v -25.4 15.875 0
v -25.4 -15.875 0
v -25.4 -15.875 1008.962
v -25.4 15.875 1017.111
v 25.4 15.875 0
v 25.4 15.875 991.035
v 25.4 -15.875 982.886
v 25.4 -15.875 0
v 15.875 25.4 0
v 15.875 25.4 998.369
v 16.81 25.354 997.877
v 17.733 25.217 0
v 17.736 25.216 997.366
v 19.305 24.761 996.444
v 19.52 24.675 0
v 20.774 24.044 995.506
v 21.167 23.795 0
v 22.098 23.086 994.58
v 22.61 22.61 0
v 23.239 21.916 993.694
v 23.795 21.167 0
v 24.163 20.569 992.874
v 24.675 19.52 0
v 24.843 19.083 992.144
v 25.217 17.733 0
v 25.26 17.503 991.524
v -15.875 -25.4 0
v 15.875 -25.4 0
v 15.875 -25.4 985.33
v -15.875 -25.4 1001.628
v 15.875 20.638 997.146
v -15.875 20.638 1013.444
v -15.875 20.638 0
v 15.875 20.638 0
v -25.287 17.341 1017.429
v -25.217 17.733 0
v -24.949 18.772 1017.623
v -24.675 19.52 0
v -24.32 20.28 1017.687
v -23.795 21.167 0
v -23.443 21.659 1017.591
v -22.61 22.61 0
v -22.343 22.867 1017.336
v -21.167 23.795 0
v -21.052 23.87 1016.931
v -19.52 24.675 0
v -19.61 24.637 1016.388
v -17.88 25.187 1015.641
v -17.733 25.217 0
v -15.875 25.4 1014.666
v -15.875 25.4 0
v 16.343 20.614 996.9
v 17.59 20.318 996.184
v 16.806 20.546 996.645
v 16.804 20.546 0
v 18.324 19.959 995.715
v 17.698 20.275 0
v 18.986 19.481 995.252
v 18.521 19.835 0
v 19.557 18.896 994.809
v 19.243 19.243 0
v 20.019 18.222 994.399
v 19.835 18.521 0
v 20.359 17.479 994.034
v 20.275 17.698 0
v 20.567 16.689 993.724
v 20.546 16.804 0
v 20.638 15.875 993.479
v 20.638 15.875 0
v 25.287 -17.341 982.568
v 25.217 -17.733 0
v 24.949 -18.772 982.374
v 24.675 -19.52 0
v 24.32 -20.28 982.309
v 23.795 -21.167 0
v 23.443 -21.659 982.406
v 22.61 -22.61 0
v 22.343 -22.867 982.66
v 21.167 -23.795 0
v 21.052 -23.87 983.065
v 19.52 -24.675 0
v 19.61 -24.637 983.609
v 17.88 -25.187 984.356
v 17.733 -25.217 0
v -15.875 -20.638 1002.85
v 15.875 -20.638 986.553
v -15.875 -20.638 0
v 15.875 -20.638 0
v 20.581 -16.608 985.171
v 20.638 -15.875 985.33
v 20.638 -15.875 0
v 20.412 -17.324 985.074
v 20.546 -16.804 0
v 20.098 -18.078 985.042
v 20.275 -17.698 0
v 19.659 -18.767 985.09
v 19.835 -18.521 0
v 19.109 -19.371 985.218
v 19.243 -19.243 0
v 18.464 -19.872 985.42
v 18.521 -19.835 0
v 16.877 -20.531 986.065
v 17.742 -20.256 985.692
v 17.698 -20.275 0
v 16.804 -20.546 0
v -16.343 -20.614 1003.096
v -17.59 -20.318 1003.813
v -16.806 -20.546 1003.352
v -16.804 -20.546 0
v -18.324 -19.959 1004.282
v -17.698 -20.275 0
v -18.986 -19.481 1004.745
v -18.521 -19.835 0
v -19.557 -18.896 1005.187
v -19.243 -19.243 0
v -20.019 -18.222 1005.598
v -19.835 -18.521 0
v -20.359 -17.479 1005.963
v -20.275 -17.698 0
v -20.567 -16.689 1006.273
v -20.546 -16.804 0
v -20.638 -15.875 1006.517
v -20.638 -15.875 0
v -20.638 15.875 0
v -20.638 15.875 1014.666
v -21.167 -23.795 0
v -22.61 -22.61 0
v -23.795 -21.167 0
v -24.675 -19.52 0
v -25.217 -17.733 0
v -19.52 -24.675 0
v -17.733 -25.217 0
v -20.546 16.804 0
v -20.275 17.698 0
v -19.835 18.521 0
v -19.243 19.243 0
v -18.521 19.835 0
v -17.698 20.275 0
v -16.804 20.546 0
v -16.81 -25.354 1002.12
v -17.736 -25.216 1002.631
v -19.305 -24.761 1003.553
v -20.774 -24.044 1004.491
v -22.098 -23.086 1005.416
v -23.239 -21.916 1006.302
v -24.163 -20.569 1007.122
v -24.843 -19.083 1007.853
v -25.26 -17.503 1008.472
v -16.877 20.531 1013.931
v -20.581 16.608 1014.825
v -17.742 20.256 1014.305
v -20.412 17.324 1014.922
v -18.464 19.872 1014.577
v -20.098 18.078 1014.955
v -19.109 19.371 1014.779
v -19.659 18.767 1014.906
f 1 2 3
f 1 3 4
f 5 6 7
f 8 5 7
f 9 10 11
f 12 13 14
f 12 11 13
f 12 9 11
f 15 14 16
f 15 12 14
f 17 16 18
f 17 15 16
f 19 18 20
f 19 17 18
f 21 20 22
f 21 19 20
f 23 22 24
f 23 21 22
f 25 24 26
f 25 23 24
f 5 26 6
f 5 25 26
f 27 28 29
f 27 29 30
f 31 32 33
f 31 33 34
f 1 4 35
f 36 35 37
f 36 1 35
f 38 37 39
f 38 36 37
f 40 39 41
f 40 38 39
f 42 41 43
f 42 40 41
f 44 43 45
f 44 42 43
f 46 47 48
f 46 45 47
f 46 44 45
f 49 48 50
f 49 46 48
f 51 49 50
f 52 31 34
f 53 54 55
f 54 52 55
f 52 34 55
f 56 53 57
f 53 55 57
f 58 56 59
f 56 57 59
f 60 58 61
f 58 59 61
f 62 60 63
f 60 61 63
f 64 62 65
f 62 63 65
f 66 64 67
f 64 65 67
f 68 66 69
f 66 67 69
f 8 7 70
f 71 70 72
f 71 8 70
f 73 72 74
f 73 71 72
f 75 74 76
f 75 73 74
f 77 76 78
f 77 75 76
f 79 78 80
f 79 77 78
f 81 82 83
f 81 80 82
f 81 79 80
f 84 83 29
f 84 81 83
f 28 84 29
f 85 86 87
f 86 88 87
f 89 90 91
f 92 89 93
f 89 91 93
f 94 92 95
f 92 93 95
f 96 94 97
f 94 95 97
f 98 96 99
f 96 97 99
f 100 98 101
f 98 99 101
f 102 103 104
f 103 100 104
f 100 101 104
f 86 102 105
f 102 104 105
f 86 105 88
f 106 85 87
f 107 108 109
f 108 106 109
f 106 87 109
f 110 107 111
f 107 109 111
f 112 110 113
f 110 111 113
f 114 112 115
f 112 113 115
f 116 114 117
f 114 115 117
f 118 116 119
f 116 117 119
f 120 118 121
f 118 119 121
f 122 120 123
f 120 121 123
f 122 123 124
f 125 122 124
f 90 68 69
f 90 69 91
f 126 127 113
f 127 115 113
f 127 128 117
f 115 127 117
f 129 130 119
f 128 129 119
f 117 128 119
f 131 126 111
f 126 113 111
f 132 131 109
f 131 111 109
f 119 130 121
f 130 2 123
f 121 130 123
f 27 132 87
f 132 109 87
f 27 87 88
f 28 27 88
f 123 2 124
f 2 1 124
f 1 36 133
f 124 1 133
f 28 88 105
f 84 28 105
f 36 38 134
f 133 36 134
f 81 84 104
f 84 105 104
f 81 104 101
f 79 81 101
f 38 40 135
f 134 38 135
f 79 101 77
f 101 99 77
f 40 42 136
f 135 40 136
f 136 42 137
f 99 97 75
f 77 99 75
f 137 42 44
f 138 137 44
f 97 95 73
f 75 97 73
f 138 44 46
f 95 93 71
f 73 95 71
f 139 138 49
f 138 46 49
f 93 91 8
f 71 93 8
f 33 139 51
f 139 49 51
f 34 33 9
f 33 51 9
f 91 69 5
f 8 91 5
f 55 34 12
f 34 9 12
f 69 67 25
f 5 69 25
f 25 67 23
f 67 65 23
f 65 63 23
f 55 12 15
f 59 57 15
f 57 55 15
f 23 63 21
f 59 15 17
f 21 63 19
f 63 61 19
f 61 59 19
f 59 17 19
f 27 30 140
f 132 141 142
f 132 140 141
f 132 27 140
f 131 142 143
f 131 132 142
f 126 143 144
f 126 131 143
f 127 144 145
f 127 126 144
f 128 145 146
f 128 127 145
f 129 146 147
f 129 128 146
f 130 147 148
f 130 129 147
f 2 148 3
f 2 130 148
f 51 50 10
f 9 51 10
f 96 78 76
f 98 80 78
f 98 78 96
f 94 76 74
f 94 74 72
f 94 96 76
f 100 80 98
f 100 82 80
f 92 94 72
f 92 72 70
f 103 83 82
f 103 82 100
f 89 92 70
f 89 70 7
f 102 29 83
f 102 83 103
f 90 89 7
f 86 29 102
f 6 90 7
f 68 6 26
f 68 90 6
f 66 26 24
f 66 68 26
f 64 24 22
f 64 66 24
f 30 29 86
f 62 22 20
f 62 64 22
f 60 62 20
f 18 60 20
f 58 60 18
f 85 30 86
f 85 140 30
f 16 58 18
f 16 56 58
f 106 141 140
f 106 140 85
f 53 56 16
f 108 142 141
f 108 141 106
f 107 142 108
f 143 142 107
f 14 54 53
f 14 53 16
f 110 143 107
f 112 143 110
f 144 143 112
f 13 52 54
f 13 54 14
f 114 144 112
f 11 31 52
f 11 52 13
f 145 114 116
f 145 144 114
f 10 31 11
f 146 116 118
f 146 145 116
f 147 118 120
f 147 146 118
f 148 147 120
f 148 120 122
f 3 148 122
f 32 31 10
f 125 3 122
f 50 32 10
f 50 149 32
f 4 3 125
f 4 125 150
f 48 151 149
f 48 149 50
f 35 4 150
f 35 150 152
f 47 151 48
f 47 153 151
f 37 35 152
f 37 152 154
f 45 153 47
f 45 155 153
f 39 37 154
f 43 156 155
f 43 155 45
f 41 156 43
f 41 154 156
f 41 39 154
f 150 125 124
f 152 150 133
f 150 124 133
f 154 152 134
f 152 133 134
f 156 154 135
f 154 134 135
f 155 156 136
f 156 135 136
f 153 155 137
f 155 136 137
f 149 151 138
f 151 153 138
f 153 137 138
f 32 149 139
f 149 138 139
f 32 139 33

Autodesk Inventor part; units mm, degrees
ref_plane "Plano inicial" through (0, 0, 0) normal (0, 0, 1) x (1, 0, 0)
ref_plane "Plano final" through (0, 0, 1019.5555) normal (0, 0, 1) x (1, 0, 0)
sketch "Esboço" plane through (0, 0, 0) normal (0, 0, 1) x (1, 0, 0)
  line L0 (-25.4, -15.875) -> (-25.4, 15.875)
  line L1 (-15.875, 25.4) -> (15.875, 25.4)
  line L2 (25.4, 15.875) -> (25.4, -15.875)
  line L3 (15.875, -25.4) -> (-15.875, -25.4)
  arc A0 (-25.4, -15.875) -> (-15.875, -25.4) centre (-15.875, -15.875) ccw
  arc A1 (-15.875, 25.4) -> (-25.4, 15.875) centre (-15.875, 15.875) ccw
  arc A2 (25.4, 15.875) -> (15.875, 25.4) centre (15.875, 15.875) ccw
  arc A3 (15.875, -25.4) -> (25.4, -15.875) centre (15.875, -15.875) ccw
  arc A4 (-15.875, 20.6375) -> (-20.6375, 15.875) centre (-15.875, 15.875) ccw
  line L4 (-15.875, 20.6375) -> (15.875, 20.6375)
  arc A5 (20.6375, 15.875) -> (15.875, 20.6375) centre (15.875, 15.875) ccw
  line L5 (20.6375, 15.875) -> (20.6375, -15.875)
  arc A6 (15.875, -20.6375) -> (20.6375, -15.875) centre (15.875, -15.875) ccw
  line L6 (15.875, -20.6375) -> (-15.875, -20.6375)
  arc A7 (-20.6375, -15.875) -> (-15.875, -20.6375) centre (-15.875, -15.875) ccw
  line L7 (-20.6375, -15.875) -> (-20.6375, 15.875)
  line L8 (0, 38.3218) -> (0, -38.3218) construction
  line L9 (-38.3218, 0) -> (38.3218, 0) construction
  dimension "d10" = 50.8
  dimension "d11" = 50.8
  dimension "d12" = 4.7625
  dimension "d15" = 25.4
  dimension "d16" = 25.4
  dimension "d17" = 9.525
extrude "Corpo" add sketch "Esboço" along normal up to surface (1019.5555 mm away) from surface at 0
sketch "Sketch3" plane through (0, 0, 0) normal (0, 0, 1) x (1, 0, 0)
  line L0 (0, 0) -> (10, 0)
ref_plane "Work Plane3" through (0, 0, 0) normal (0, -1, 0) x (1, 0, 0)
sketch "Sketch4" plane through (0, 0, 0) normal (0, -1, 0) x (1, 0, 0)
  line L0 (-2, 0) -> (12, 0)
  line L1 (-2, 1019.5555) -> (12, 1019.5555)
  dimension "d19" = 1019.5555
ref_plane "Plano de trabalho4" through (-27.5692, 13.7846, 1017.688) normal (0.4452, -0.2226, 0.8673) x (0.8939, 0.0531, -0.4452)
split "Dividir1" plane through (-27.5692, 13.7846, 1017.688) removes the side toward (0.4452, -0.2226, 0.8673)
equation "\"d10\" = G_H"
equation "\"d11\" = G_W"
equation "\"d12\" = G_T"
equation "\"d15\" = 0.5 * d10"
equation "\"d16\" = 0.5 * d11"
equation "\"d17\" = G_IR"
equation "\"d3\" = G_L"
equation "\"G_W\" = 50.8"
equation "\"G_H\" = 50.8"
equation "\"G_T\" = 4.7625"
equation "\"G_IR\" = 9.525"
equation "\"G_L\" = 1017.40763"
equation "\"G_OFFSET_START\" = 0"
equation "\"G_OFFSET_END\" = 19.55551"
equation "\"d14\" = G_OFFSET_END + B_L"
equation "\"B_L\" = 1000"
properties part number "AISC - 2 x 2 x 3/16 - 40,055" material "Aço, suave"
